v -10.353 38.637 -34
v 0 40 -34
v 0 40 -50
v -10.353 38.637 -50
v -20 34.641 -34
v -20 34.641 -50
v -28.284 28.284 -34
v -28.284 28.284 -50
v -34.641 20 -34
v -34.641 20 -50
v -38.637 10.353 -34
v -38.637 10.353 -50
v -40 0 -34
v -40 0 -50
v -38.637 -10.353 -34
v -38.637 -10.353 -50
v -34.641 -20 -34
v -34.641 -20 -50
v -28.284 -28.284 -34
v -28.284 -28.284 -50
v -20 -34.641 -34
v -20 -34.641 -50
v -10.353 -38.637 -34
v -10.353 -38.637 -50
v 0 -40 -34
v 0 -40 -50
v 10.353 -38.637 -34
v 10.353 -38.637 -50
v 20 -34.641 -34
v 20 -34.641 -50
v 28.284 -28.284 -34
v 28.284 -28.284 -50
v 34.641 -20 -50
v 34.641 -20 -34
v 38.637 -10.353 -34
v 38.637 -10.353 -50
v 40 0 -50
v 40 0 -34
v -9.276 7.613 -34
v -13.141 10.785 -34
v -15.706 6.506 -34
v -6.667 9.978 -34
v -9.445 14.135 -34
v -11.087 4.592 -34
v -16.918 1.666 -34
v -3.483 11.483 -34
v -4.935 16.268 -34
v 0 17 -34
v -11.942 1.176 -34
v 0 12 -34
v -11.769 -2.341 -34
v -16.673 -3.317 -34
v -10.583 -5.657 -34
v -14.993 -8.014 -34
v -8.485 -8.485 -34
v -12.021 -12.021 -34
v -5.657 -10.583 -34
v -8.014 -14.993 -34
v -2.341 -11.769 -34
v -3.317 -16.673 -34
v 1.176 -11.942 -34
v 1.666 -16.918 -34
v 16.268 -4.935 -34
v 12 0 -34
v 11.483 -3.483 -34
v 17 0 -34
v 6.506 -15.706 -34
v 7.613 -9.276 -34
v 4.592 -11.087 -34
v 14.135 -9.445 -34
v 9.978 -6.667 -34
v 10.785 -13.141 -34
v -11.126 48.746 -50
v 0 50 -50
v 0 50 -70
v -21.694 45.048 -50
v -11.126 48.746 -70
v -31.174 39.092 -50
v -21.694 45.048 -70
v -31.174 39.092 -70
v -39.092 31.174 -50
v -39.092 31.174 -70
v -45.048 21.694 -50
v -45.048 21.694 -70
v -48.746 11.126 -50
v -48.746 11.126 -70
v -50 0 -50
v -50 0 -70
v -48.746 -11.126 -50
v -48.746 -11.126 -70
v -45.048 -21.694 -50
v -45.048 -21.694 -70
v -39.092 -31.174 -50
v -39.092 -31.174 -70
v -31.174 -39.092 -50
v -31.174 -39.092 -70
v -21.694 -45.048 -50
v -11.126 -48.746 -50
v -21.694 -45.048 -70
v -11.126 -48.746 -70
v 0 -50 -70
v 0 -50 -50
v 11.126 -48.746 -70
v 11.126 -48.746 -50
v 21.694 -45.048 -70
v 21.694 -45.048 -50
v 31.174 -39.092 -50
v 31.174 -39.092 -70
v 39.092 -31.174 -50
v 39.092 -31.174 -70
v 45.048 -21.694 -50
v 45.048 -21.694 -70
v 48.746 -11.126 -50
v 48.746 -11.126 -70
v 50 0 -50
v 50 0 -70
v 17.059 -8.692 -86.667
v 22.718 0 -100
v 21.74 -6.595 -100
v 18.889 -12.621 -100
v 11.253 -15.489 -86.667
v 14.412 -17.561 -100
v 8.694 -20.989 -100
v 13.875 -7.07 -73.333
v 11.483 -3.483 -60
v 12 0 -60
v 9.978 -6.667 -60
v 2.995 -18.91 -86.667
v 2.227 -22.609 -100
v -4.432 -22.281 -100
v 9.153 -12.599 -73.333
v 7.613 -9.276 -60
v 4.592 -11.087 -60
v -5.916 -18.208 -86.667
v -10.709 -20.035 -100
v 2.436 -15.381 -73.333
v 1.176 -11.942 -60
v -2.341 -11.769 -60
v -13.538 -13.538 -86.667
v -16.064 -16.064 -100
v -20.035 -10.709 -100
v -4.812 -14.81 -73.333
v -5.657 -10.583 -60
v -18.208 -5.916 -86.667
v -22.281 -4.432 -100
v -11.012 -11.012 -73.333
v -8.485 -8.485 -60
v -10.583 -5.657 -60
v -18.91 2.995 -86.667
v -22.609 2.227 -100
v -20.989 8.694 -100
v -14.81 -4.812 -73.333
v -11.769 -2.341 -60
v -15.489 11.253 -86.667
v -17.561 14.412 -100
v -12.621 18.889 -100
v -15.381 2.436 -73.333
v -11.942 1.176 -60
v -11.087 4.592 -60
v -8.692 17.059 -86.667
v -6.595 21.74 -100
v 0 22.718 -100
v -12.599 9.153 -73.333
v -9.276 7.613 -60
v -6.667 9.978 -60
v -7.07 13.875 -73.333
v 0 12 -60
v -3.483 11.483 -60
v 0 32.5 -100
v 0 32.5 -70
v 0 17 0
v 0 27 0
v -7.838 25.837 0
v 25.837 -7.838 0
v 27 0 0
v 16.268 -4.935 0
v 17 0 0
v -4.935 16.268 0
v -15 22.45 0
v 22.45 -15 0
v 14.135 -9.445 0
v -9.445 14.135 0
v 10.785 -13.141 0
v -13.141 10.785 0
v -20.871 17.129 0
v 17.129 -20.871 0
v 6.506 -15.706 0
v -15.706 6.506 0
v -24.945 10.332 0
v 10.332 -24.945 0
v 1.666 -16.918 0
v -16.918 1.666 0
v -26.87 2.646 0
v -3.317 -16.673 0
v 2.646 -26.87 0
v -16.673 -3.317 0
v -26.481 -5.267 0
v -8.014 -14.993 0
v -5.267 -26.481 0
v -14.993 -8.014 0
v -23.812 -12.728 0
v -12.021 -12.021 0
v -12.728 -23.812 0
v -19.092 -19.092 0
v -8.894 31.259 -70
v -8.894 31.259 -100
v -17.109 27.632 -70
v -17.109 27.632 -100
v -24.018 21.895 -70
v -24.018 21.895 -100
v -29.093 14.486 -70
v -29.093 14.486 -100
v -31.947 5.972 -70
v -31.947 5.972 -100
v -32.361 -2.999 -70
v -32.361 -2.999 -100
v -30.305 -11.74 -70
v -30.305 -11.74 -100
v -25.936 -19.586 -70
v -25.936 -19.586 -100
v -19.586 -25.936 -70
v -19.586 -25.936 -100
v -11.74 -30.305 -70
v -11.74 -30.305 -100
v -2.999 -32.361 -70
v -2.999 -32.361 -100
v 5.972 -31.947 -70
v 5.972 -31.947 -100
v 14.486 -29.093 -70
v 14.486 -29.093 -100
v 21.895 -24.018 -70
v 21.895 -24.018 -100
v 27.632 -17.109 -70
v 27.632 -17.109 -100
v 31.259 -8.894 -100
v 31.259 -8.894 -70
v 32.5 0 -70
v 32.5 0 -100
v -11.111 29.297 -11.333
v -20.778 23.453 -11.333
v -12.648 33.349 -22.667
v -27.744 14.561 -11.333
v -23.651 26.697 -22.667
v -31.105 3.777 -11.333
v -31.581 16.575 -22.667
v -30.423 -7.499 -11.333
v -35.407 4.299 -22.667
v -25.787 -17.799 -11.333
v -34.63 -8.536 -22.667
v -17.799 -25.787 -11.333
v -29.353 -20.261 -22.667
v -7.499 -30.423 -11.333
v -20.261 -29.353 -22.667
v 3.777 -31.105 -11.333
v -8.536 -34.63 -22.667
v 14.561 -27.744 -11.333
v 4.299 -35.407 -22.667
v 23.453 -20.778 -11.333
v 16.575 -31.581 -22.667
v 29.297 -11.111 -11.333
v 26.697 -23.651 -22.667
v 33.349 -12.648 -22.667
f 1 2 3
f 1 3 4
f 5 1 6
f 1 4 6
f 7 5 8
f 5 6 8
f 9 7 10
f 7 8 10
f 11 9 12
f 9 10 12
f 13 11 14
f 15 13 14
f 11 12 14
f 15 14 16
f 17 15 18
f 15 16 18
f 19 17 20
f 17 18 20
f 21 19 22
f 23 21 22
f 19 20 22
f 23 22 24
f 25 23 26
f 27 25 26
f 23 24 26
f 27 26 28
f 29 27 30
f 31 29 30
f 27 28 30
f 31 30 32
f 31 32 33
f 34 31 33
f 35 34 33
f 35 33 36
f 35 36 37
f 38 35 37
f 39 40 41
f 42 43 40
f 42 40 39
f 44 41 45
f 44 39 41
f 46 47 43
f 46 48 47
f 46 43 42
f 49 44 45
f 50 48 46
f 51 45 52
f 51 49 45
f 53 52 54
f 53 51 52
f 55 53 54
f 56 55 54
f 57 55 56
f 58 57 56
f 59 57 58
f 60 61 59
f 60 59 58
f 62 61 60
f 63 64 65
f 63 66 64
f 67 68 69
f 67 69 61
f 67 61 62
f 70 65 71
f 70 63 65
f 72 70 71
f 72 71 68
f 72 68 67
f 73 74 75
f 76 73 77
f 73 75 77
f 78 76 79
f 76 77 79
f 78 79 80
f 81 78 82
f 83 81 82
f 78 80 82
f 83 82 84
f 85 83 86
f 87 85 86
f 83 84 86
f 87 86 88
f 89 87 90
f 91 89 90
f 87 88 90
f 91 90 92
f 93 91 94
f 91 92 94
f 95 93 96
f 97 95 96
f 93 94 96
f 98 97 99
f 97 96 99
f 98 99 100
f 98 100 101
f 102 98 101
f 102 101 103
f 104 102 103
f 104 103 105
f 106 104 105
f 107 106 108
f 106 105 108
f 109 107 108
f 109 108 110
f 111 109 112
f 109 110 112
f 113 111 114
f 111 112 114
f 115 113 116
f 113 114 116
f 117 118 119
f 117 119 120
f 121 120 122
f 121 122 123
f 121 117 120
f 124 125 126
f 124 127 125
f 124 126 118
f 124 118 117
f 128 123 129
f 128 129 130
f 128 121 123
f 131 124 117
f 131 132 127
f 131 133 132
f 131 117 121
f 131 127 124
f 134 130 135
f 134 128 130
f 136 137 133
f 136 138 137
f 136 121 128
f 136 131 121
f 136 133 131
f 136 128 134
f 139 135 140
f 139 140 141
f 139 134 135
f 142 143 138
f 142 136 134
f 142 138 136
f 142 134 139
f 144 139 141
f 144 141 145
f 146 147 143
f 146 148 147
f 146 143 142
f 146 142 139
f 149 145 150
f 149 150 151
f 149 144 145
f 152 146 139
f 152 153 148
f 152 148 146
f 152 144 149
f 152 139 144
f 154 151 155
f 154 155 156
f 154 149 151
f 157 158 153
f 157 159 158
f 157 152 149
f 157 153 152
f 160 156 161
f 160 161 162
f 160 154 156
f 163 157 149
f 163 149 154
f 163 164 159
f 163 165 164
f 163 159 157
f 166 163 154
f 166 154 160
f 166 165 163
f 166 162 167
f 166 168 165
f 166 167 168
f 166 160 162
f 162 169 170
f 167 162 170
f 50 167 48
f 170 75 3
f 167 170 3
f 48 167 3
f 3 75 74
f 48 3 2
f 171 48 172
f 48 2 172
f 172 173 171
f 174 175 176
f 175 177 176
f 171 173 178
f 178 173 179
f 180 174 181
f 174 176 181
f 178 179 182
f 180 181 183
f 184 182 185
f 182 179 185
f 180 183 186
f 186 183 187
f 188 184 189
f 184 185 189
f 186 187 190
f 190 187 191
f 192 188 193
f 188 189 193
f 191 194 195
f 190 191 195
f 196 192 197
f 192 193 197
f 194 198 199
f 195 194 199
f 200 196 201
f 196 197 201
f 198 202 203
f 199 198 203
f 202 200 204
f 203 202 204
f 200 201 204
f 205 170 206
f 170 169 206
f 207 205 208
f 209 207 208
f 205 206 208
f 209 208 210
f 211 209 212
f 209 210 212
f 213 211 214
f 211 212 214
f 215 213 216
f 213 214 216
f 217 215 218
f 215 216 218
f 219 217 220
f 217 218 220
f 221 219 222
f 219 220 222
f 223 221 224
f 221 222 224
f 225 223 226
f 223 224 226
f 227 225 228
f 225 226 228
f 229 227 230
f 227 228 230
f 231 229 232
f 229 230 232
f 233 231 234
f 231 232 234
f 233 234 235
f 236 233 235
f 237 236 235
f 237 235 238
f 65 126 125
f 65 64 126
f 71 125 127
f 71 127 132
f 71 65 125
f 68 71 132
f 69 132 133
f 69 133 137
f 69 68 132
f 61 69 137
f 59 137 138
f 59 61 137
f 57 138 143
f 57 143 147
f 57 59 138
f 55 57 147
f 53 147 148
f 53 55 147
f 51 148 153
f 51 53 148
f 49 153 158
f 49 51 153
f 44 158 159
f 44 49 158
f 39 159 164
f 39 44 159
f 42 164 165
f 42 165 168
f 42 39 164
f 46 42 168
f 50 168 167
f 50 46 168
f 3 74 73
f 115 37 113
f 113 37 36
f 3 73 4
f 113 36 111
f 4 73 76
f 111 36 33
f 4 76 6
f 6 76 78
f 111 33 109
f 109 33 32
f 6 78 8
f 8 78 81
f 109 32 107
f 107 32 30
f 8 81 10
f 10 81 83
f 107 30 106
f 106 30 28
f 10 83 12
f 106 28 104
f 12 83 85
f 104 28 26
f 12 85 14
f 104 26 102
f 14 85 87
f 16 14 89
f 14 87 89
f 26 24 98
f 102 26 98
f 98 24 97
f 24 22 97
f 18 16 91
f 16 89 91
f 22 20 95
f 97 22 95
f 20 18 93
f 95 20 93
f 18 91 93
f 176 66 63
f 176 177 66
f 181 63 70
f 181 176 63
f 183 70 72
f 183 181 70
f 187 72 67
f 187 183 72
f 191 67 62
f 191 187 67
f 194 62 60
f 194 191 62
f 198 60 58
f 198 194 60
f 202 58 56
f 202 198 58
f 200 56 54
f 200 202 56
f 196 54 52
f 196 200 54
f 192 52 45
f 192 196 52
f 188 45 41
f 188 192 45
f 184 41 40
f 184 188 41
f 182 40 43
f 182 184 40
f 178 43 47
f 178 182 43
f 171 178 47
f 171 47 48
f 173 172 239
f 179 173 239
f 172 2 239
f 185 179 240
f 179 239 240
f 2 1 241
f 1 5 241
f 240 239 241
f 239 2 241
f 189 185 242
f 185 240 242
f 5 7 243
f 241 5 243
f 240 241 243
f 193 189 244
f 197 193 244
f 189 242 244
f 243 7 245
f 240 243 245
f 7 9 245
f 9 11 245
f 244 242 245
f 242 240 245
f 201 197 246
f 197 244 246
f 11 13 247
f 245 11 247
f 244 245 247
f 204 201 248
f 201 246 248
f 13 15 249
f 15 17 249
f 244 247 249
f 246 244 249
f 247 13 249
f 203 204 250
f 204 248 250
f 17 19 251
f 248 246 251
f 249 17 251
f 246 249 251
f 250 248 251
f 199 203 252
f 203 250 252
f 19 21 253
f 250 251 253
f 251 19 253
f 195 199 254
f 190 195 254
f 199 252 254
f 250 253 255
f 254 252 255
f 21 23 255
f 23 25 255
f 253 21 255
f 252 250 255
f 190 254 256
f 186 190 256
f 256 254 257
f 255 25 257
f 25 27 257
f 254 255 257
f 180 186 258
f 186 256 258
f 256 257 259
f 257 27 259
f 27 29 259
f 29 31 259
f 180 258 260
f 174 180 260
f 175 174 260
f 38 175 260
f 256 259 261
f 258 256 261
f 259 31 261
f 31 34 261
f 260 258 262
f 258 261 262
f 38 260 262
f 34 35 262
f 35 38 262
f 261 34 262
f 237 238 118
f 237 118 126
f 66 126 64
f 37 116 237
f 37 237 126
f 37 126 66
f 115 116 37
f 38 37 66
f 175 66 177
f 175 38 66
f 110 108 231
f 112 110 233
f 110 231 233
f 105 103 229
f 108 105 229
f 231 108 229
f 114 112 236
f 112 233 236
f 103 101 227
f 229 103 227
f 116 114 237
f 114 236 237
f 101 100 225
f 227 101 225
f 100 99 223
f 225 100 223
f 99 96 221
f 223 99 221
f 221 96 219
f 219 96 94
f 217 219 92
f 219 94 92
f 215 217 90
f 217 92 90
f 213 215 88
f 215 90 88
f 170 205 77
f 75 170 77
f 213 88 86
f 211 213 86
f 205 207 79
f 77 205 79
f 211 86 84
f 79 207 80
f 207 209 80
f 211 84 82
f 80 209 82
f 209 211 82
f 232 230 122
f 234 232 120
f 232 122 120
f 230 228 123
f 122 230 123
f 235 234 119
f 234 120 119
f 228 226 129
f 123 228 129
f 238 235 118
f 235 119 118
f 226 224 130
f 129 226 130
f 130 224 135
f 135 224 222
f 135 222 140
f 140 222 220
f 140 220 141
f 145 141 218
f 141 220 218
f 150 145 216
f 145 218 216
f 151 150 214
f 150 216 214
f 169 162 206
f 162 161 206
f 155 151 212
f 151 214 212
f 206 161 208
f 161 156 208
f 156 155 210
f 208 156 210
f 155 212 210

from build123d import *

# Parameters (mm, degrees)
REVOLVE1_ANGLE = 270


with BuildPart() as part:
    # Sketch1 → Revolve1 (revolve)
    with BuildSketch(Plane(origin=(0, 0, 0), x_dir=(0, 0, -1), z_dir=(1, 0, 0))):
        Polygon((0, 0), (0, 27), (34, 40), (50, 40), (50, 50), (70, 50), (70, 32.5), (100, 32.5), (100, 0), align=None)
    revolve(axis=Axis((0, 0, -100), (0, 0, 1)), revolution_arc=REVOLVE1_ANGLE)

    # Sketch3 → Cut-Revolve1 (revolve, cut)
    with BuildSketch(Plane(origin=(0, 0, 0), x_dir=(0, 0, -1), z_dir=(1, 0, 0))):
        Polygon((0, 17), (0, 0), (100, 0), (100, 22.717967697), (60, 12), (34, 12), (34, 17), align=None)
    revolve(axis=Axis((0, 0, 0), (0, 0, -1)), mode=Mode.SUBTRACT)


solid = part.part
